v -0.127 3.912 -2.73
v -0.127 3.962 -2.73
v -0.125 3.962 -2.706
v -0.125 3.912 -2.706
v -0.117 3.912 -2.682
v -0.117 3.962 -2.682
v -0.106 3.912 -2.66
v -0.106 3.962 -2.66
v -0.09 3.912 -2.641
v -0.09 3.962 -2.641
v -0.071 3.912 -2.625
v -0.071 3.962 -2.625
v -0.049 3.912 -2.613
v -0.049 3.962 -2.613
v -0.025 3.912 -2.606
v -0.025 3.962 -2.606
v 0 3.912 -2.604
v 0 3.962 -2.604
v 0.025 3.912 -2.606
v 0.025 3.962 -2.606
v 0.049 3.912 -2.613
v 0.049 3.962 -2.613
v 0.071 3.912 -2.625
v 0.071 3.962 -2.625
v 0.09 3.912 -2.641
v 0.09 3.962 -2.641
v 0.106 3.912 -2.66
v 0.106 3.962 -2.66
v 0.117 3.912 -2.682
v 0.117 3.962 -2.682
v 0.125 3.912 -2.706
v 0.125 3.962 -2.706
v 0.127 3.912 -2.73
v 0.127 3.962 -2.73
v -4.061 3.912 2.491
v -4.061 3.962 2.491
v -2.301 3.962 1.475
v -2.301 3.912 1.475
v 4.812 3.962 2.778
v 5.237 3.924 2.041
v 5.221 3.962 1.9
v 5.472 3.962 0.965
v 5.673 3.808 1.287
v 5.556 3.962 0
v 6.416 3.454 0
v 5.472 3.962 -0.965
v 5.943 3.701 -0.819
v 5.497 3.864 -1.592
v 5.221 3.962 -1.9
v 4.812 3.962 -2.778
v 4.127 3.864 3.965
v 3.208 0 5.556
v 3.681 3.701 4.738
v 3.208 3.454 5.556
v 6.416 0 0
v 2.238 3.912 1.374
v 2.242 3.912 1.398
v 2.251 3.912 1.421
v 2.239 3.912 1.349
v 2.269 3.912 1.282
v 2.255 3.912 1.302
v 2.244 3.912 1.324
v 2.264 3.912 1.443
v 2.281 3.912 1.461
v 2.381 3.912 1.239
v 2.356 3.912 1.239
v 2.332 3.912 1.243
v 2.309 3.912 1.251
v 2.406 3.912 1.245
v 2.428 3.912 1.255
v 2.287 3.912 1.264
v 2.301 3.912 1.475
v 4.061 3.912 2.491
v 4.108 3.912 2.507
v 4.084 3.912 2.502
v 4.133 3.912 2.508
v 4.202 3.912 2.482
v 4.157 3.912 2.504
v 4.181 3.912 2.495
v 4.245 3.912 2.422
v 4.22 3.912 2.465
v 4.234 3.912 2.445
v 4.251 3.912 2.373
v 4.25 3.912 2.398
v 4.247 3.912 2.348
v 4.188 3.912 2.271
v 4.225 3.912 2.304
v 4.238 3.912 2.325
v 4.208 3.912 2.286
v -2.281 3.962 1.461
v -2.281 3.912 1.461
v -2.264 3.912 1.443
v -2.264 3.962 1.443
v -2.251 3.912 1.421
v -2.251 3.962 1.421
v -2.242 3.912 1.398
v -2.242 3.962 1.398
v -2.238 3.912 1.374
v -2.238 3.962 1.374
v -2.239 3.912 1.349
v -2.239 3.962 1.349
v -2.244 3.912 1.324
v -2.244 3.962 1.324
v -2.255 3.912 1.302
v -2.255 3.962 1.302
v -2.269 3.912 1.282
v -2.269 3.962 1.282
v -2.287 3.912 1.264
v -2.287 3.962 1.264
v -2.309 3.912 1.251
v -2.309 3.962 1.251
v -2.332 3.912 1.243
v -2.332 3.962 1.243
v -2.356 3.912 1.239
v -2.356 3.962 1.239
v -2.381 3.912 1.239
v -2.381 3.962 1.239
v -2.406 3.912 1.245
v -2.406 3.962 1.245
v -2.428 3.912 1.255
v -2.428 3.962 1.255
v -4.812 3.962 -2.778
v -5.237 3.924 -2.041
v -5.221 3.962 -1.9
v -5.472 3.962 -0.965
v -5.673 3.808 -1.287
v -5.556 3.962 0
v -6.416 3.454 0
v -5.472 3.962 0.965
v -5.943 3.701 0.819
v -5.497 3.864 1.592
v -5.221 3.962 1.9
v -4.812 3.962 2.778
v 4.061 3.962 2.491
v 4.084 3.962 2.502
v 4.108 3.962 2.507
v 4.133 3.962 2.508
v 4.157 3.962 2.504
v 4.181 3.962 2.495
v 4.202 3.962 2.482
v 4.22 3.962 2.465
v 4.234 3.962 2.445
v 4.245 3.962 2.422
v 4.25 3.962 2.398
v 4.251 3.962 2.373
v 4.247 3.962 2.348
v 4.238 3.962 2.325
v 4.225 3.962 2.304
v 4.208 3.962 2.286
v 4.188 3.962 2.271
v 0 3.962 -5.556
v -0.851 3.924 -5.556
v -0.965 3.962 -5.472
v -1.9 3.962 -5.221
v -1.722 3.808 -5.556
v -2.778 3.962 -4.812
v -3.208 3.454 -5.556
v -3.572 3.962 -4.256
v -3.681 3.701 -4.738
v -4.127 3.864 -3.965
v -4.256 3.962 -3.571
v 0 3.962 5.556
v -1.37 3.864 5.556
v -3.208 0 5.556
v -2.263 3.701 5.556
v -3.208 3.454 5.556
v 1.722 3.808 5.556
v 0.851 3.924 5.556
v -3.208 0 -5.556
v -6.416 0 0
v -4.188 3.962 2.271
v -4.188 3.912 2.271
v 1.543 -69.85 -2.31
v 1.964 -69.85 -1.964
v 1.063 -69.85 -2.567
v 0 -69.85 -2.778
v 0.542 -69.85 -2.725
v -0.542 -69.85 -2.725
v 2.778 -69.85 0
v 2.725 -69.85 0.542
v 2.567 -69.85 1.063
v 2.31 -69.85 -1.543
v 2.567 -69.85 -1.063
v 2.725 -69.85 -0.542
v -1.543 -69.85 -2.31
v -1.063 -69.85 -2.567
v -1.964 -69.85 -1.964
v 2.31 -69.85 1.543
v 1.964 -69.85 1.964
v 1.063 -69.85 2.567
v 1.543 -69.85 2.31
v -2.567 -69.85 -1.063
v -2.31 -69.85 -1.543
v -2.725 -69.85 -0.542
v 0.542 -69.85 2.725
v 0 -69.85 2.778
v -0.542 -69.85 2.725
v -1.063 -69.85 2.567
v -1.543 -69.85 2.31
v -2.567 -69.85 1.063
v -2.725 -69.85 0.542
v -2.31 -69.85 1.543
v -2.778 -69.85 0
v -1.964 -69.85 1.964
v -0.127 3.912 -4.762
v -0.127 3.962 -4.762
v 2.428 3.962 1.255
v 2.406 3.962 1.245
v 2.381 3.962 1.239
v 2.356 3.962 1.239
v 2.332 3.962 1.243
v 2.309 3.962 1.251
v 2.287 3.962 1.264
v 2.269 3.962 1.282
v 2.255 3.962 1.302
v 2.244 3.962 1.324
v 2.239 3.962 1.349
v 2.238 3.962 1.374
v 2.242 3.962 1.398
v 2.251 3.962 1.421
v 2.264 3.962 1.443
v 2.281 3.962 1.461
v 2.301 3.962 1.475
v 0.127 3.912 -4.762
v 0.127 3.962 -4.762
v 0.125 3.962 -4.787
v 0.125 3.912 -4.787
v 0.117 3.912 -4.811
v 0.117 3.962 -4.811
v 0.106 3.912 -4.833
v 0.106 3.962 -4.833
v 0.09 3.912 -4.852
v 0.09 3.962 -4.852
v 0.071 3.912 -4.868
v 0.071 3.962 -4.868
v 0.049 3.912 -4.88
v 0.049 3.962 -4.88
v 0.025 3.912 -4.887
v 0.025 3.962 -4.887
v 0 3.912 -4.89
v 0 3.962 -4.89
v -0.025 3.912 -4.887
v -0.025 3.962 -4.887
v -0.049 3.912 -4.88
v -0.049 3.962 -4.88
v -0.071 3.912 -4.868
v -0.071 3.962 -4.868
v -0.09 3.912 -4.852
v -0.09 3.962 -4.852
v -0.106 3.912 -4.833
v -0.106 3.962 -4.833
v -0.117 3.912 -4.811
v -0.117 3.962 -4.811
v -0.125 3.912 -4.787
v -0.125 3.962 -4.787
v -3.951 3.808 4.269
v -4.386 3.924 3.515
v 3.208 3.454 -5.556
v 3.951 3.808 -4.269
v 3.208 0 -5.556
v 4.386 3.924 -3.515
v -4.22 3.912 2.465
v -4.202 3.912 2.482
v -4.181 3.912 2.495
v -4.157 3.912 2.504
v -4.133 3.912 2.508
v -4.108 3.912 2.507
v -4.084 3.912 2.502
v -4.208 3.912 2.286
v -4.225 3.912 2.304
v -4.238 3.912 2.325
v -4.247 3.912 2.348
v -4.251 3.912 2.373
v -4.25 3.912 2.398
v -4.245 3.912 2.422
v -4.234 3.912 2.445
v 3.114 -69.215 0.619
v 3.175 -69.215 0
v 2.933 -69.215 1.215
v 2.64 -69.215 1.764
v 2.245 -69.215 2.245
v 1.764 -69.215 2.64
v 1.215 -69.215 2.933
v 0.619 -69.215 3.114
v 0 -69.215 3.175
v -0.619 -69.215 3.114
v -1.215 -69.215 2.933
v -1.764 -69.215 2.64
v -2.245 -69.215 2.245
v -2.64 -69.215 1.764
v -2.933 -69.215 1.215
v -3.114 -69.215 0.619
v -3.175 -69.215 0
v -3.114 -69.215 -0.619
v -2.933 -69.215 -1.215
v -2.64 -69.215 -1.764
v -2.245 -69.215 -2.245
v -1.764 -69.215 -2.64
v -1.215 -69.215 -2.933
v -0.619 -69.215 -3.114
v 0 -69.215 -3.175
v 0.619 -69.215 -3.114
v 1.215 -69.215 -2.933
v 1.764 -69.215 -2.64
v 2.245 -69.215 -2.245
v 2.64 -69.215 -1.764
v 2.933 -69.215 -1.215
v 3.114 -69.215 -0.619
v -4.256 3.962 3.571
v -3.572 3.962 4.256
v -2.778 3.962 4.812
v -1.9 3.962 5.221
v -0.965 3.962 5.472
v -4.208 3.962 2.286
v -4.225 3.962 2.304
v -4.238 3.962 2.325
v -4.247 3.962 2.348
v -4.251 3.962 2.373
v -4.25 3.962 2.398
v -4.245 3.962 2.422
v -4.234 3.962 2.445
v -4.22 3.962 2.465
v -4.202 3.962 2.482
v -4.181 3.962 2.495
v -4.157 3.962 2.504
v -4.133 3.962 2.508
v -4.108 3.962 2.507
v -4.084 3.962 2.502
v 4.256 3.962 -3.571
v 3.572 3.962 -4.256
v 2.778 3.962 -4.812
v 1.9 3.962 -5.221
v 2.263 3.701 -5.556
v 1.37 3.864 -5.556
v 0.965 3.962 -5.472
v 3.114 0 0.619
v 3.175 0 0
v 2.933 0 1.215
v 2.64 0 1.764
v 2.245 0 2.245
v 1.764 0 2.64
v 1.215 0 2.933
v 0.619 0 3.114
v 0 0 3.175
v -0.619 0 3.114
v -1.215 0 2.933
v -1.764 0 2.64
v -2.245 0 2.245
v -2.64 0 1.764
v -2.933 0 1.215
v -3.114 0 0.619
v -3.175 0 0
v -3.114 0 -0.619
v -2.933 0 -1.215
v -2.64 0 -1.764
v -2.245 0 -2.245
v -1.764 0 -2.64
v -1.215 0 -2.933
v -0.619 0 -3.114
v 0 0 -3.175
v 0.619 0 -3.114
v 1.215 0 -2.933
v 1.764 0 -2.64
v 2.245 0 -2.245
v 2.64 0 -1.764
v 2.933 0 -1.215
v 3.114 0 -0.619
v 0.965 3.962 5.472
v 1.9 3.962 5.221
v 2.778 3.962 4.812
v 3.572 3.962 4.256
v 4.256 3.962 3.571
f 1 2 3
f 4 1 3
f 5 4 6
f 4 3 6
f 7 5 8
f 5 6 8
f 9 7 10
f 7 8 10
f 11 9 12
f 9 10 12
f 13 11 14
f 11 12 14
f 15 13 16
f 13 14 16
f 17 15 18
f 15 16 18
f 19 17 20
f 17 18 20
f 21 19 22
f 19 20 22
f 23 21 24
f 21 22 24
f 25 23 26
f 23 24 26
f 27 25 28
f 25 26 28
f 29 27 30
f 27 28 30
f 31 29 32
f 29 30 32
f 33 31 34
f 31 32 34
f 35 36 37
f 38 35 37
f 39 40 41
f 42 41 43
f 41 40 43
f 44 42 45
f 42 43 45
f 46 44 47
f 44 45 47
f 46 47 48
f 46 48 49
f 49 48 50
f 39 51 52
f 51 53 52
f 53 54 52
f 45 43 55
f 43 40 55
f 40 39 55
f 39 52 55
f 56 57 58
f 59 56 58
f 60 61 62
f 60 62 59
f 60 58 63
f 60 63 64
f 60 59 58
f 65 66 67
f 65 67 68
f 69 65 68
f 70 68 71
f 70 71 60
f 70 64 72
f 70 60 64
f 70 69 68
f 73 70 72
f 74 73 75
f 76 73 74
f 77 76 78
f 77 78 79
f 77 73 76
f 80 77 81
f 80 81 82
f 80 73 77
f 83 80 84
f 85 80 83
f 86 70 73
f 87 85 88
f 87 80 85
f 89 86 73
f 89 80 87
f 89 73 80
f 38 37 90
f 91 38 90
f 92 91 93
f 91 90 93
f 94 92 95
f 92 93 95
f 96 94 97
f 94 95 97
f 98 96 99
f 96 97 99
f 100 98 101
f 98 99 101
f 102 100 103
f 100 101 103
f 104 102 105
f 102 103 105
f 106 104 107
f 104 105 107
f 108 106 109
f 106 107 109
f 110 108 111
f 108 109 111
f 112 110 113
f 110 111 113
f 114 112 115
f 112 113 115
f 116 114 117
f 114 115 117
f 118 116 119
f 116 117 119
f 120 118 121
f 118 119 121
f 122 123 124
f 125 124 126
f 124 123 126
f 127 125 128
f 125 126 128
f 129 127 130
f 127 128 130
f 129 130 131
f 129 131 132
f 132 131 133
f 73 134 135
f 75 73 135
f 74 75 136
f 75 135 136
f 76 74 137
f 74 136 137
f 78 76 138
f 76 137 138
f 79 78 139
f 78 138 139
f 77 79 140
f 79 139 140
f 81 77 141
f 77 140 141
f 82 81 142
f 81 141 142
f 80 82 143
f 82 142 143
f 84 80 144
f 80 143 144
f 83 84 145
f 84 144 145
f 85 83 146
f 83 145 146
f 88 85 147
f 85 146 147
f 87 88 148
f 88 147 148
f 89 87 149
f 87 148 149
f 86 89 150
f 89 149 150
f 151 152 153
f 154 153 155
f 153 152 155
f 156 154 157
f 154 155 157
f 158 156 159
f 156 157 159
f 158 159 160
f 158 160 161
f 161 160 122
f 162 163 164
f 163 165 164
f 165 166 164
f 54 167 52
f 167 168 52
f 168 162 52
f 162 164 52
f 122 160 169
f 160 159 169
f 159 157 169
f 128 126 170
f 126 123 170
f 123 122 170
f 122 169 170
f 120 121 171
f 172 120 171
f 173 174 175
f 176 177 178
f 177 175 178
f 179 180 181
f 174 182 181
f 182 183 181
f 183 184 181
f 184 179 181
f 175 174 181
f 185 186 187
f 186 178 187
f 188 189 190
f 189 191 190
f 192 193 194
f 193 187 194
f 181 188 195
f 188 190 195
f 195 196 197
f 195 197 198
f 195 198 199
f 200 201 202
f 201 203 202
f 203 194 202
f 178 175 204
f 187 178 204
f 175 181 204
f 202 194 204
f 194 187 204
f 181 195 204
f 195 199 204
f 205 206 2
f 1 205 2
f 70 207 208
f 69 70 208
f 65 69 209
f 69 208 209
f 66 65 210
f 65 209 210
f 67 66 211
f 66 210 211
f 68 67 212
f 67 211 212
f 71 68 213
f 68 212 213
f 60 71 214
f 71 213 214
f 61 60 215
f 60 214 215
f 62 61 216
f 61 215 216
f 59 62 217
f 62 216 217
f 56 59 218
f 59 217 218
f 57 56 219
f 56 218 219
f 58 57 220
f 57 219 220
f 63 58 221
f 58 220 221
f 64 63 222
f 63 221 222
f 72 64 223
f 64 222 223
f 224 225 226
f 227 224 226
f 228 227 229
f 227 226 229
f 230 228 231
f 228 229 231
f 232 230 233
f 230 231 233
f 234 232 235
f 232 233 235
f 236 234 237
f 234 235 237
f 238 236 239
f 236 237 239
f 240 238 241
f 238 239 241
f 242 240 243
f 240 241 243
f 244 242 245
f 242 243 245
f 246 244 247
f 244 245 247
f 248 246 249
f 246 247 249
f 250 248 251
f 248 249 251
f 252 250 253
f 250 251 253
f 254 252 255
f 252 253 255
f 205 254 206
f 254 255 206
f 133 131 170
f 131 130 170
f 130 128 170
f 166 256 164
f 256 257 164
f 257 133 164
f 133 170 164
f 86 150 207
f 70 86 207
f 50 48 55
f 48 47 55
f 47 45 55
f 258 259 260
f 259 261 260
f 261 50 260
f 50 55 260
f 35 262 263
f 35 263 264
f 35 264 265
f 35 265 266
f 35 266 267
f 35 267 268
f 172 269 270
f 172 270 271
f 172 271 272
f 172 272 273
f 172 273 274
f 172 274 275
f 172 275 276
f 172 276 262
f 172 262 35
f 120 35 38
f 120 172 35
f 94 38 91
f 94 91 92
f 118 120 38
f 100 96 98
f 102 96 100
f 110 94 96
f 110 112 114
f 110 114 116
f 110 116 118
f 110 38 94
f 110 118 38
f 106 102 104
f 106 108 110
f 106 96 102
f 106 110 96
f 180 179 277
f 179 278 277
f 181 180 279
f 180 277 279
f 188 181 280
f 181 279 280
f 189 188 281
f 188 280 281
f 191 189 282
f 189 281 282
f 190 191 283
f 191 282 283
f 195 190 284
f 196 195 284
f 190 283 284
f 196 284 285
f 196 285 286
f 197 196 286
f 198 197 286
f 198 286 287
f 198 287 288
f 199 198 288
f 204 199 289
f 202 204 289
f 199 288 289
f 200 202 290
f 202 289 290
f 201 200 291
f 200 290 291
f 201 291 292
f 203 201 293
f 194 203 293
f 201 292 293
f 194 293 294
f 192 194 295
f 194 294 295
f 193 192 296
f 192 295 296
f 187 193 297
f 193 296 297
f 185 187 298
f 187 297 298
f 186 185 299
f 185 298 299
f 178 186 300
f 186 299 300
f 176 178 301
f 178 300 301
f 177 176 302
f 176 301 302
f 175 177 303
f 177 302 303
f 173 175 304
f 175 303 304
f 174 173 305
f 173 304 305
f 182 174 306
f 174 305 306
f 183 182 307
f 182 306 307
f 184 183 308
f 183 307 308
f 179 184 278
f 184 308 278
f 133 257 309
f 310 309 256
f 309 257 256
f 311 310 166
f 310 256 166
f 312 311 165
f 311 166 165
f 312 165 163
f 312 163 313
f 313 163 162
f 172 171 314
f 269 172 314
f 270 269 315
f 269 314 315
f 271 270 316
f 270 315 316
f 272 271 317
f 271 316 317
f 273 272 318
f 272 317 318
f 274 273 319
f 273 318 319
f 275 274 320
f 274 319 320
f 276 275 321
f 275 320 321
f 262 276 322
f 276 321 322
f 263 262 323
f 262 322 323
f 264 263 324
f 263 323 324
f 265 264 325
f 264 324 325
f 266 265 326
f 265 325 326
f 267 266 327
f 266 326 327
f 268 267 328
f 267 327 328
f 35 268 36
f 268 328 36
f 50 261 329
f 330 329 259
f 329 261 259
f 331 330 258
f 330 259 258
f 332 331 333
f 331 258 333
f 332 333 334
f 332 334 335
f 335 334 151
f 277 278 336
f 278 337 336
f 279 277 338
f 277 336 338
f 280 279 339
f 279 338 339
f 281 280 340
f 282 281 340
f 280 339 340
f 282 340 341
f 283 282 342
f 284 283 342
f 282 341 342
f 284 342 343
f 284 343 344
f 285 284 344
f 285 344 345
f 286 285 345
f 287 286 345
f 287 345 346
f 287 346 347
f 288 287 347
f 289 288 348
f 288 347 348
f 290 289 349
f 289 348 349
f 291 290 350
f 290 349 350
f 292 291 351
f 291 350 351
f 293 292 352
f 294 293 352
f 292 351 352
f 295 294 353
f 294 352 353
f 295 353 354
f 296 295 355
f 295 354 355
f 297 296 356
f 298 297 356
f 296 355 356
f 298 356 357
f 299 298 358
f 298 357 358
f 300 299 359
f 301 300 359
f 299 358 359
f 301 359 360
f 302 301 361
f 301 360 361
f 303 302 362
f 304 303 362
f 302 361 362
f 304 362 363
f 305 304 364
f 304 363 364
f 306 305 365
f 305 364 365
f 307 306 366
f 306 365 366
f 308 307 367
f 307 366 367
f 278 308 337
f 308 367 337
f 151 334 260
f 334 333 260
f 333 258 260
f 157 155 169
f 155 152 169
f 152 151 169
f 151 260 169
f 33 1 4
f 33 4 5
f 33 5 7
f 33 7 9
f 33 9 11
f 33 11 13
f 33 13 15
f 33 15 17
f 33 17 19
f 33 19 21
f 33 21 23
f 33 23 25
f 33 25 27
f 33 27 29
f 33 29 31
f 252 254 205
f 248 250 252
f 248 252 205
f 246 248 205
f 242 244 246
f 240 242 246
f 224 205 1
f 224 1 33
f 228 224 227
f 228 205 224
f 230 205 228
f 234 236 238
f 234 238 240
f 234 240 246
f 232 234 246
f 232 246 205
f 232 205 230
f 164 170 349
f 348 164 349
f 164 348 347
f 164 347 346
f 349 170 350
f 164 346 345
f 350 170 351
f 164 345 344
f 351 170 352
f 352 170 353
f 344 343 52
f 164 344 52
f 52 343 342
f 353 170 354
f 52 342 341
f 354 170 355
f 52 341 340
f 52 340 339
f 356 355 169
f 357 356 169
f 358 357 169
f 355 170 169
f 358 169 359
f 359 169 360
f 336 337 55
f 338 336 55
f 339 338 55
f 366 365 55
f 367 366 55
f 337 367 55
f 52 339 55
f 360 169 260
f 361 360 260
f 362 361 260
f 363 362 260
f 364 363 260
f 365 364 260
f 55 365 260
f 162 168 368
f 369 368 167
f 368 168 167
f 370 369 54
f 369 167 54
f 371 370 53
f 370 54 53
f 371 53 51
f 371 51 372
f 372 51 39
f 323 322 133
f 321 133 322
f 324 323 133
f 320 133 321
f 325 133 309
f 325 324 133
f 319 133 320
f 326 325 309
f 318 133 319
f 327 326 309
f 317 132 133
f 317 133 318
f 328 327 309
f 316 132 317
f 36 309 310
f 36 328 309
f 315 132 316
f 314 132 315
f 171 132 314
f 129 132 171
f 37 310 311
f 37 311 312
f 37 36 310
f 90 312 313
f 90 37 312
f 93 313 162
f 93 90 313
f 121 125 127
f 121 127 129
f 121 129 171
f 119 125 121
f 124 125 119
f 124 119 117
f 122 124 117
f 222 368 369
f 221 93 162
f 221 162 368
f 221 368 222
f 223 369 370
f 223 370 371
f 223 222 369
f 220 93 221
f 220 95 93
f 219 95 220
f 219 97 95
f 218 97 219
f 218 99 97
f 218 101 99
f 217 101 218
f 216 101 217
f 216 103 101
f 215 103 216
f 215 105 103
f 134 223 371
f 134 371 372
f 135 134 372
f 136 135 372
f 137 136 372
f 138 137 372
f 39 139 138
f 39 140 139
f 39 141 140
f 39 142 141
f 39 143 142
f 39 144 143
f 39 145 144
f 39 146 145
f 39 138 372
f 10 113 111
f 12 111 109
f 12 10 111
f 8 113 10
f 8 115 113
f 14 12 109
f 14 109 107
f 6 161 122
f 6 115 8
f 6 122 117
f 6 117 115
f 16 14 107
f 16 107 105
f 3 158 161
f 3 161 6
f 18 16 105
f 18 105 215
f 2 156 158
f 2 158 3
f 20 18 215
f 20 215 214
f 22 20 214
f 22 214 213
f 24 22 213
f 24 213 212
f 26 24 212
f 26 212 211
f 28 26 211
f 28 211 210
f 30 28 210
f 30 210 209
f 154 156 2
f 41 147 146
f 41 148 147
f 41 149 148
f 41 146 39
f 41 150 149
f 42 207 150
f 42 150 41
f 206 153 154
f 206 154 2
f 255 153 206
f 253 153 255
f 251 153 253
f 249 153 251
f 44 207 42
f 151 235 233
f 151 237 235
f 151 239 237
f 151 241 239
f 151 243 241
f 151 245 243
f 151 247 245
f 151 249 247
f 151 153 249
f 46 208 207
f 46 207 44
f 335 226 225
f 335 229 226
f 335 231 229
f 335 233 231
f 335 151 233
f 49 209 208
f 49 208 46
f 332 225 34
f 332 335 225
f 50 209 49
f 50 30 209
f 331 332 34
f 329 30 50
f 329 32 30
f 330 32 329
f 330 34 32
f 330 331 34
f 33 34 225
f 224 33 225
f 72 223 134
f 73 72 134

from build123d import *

# Parameters (mm, degrees)
BOSS_EXTRUDE1_DEPTH = 3.9624
CUT_EXTRUDE1_DEPTH  = 0.0508


with BuildPart() as part:
    # Sketch1 → Boss-Extrude1 (new body)
    with BuildSketch(Plane(origin=(0, 0, 0), x_dir=(1, 0, 0), z_dir=(0, 1, 0))):
        Polygon((6.415804866, 0), (3.207902433, 5.55625), (-3.207902433, 5.55625), (-6.415804866, 0), (-3.207902433, -5.55625), (3.207902433, -5.55625), align=None)
    extrude(amount=BOSS_EXTRUDE1_DEPTH)

    # Sketch2 → Cut-Revolve1 (revolve, cut)
    with BuildSketch(Plane.XY):
        Polygon((5.55625, 3.9624), (6.415804866, 3.4544), (6.415804866, 3.9624), align=None)
    revolve(axis=Axis((0, 0, 0), (0, 1, 0)), mode=Mode.SUBTRACT)

    # Sketch3 → Cut-Extrude1 (cut)
    with BuildSketch(Plane(origin=(0, 3.9624, 0), x_dir=(-1, 0, 0), z_dir=(0, -1, 0))):
        with BuildLine():
            Line((0.127, 4.7625), (0.127, 2.7305))
            ThreePointArc((0.127, 2.7305), (0, 2.6035), (-0.127, 2.7305))
            Line((-0.127, 2.7305), (-0.127, 4.7625))
            ThreePointArc((-0.127, 4.7625), (0, 4.8895), (0.127, 4.7625))
        make_face()
        with BuildLine():
            Line((4.060945986, -2.491235226), (2.301182365, -1.475235226))
            ThreePointArc((2.301182365, -1.475235226), (2.254697139, -1.30175), (2.428182365, -1.255264774))
            Line((2.428182365, -1.255264774), (4.187945986, -2.271264774))
            ThreePointArc((4.187945986, -2.271264774), (4.234431212, -2.44475), (4.060945986, -2.491235226))
        make_face()
        with BuildLine():
            Line((-4.187945986, -2.271264774), (-2.428182365, -1.255264774))
            ThreePointArc((-2.428182365, -1.255264774), (-2.254697139, -1.30175), (-2.301182365, -1.475235226))
            Line((-2.301182365, -1.475235226), (-4.060945986, -2.491235226))
            ThreePointArc((-4.060945986, -2.491235226), (-4.234431212, -2.44475), (-4.187945986, -2.271264774))
        make_face()
    extrude(amount=CUT_EXTRUDE1_DEPTH, mode=Mode.SUBTRACT)

    # Bolt Length Sketch → Bolt Length (revolve)
    with BuildSketch(Plane.XY):
        Polygon((0, 0), (0, -69.85), (2.778125, -69.85), (3.175, -69.215), (3.175, 0), align=None)
    revolve(axis=Axis((0, 0, 0), (0, -1, 0)))


solid = part.part
